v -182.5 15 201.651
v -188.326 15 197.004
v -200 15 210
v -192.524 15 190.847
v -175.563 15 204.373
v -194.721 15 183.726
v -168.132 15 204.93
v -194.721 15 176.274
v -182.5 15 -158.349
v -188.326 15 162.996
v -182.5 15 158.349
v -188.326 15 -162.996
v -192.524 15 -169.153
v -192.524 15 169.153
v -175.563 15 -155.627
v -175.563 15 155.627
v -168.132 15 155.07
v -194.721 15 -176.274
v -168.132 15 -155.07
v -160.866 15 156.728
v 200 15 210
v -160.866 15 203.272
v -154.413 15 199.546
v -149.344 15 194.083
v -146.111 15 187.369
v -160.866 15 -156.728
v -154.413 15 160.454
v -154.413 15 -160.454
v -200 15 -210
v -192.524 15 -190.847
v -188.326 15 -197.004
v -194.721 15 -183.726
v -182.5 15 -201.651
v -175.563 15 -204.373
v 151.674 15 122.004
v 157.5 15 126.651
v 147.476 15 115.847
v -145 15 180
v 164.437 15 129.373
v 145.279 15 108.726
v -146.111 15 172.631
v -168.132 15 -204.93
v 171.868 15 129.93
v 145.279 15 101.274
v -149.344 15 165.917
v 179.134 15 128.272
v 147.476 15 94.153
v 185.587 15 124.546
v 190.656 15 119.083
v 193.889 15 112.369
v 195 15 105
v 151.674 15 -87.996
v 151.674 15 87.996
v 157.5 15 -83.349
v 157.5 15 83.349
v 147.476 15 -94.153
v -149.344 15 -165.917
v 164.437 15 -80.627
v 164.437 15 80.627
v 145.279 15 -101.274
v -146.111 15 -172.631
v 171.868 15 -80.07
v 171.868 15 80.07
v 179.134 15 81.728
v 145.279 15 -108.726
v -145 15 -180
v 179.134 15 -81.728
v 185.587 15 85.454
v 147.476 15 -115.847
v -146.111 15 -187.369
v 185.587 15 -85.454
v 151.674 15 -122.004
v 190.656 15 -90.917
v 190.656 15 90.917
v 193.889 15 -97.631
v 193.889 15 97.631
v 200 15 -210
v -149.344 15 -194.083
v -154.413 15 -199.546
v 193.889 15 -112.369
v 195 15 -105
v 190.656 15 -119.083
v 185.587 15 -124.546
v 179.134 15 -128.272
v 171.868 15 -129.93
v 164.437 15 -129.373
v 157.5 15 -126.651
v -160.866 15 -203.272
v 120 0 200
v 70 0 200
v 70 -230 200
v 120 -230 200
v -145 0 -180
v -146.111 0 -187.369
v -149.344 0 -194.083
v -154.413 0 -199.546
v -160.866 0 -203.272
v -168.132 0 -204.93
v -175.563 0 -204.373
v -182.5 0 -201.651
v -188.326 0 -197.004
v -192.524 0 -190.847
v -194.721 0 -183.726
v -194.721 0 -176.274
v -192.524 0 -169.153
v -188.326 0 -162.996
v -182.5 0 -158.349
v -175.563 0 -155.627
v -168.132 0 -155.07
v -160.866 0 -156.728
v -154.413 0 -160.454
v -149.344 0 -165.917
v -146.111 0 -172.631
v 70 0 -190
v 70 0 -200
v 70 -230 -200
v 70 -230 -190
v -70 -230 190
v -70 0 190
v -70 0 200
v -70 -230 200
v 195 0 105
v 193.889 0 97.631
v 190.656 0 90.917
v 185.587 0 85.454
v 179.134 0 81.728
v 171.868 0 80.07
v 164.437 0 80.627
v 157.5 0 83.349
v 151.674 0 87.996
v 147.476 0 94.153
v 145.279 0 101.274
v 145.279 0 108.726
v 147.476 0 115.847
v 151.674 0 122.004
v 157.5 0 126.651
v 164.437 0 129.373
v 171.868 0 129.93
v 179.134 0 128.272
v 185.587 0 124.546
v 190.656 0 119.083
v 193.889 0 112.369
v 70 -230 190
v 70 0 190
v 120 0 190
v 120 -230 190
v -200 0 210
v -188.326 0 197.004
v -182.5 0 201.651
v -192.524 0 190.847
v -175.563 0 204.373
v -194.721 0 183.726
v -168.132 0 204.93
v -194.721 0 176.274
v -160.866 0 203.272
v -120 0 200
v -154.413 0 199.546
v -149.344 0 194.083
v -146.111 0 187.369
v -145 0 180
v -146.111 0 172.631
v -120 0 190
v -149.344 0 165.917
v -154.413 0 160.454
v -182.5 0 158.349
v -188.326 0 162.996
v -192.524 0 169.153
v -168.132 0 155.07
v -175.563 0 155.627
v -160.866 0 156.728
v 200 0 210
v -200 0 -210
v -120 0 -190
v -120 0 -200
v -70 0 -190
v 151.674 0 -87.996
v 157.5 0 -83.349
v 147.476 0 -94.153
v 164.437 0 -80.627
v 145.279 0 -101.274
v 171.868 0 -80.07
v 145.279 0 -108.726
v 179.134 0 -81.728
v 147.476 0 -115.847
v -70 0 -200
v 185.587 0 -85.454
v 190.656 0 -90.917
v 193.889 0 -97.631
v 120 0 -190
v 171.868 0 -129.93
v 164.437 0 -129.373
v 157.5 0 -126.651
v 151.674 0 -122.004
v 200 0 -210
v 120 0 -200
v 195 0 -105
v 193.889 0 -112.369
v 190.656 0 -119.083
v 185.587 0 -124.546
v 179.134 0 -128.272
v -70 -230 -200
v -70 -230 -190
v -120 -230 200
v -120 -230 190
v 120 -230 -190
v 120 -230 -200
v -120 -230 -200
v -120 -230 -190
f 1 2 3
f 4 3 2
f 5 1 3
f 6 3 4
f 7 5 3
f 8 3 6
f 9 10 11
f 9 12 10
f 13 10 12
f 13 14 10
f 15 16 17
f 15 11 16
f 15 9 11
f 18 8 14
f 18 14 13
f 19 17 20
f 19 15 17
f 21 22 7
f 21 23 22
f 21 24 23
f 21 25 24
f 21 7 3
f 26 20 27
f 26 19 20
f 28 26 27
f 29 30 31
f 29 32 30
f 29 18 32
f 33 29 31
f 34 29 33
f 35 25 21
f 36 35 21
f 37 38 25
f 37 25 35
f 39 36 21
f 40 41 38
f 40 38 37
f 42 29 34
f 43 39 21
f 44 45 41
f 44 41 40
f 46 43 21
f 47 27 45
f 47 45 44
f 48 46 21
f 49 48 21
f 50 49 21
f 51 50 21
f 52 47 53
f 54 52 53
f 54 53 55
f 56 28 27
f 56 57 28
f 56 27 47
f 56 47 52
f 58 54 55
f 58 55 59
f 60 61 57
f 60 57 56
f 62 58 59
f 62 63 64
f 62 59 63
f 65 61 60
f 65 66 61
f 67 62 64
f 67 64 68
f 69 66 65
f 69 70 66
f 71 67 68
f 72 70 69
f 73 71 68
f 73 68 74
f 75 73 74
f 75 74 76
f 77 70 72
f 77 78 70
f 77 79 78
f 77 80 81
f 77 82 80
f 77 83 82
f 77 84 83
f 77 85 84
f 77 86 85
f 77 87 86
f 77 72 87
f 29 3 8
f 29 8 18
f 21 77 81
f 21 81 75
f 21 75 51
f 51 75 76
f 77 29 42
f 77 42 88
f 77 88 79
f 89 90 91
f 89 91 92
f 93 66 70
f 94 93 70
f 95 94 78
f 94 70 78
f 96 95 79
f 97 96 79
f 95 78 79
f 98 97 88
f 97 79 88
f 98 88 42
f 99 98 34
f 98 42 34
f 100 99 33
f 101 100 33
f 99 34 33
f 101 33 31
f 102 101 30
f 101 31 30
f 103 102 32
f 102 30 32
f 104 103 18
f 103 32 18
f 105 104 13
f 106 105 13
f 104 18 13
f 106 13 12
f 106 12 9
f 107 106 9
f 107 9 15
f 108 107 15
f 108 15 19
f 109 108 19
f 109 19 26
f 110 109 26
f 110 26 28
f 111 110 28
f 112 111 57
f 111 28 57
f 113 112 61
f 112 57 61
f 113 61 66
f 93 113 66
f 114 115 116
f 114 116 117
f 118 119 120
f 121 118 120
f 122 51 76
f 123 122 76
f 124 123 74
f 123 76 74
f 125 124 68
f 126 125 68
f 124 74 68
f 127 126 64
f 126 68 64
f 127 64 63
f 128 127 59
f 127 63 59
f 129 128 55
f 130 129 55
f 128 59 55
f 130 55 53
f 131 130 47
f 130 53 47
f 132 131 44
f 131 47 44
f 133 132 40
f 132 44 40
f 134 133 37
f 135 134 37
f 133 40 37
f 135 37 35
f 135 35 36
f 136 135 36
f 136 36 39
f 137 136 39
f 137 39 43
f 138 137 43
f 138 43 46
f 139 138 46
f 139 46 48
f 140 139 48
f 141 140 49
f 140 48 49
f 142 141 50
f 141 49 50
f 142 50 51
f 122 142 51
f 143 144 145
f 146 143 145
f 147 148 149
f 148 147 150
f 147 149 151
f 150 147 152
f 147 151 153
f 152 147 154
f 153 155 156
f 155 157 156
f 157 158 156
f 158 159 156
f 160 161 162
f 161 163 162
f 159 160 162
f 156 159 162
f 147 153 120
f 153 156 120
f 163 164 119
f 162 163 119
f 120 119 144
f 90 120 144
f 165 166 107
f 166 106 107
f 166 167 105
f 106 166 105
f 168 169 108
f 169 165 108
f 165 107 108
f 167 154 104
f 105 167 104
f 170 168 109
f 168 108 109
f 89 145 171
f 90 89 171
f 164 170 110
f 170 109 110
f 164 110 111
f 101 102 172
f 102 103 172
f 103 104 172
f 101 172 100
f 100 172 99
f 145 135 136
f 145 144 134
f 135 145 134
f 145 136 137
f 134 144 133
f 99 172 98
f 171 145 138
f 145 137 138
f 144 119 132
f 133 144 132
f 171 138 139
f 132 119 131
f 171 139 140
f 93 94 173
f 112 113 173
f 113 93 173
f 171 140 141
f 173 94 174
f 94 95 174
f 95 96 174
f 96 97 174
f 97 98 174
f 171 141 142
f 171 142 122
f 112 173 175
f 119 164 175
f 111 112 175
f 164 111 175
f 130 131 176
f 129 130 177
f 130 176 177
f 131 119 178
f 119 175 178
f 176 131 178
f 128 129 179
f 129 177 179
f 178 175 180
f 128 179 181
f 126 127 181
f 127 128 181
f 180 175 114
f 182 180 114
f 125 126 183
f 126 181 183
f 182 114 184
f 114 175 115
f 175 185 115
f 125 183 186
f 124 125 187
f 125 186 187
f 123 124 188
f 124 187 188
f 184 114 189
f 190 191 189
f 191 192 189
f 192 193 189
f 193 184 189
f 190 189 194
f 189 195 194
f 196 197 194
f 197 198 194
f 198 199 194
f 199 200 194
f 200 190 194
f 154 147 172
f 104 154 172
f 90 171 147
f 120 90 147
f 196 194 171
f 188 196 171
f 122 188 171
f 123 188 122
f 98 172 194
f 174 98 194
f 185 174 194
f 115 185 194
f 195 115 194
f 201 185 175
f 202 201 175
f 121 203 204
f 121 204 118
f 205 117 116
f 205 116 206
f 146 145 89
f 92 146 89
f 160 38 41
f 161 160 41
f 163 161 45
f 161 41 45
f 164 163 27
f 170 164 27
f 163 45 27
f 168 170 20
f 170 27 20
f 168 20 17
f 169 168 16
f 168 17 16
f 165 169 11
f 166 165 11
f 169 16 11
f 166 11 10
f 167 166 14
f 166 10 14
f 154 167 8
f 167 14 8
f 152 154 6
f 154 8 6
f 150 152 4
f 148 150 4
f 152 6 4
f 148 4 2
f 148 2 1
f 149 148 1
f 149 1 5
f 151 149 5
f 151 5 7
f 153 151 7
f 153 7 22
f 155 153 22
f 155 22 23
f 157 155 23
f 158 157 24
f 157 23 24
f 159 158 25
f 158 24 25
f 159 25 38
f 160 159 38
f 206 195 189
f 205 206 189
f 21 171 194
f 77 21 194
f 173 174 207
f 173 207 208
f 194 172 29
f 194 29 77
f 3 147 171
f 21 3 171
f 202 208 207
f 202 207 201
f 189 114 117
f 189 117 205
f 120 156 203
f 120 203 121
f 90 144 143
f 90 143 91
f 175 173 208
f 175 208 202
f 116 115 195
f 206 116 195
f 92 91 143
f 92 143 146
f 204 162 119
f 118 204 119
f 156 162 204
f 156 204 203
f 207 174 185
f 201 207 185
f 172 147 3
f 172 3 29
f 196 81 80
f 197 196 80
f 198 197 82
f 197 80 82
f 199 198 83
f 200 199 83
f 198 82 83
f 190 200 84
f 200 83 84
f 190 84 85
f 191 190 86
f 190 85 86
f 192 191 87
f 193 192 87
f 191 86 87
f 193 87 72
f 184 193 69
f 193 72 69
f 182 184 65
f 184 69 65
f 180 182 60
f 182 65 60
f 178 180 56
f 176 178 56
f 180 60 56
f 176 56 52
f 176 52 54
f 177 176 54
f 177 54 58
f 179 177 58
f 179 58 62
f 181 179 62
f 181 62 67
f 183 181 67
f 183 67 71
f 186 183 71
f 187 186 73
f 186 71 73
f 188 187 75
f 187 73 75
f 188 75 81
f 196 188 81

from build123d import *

# Parameters (mm, degrees)
SKETCH1_W           = 400
SKETCH1_H           = 420
BOSS_EXTRUDE1_DEPTH = 15
SKETCH2_R           = 25
CUT_EXTRUDE1_DEPTH  = 15
SKETCH3_W           = 50
SKETCH3_H           = 10
BOSS_EXTRUDE2_DEPTH = 230


with BuildPart() as part:
    # Sketch1 → Boss-Extrude1 (new body)
    with BuildSketch(Plane(origin=(0, 0, 0), x_dir=(1, 0, 0), z_dir=(0, 1, 0))):
        Rectangle(SKETCH1_W, SKETCH1_H)
    extrude(amount=BOSS_EXTRUDE1_DEPTH)

    # Sketch2 → Cut-Extrude1 (cut)
    with BuildSketch(Plane(origin=(0, 15, 0), x_dir=(1, 0, 0), z_dir=(0, 1, 0))):
        with Locations((-170, 180)):
            Circle(SKETCH2_R)
        with Locations((-170, -180)):
            Circle(SKETCH2_R)
        with Locations((170, -105)):
            Circle(SKETCH2_R)
        with Locations((170, 105)):
            Circle(SKETCH2_R)
    extrude(amount=-CUT_EXTRUDE1_DEPTH, mode=Mode.SUBTRACT)

    # Sketch3 → Boss-Extrude2 (add)
    with BuildSketch(Plane.XZ):
        with Locations((-95, 195)):
            Rectangle(SKETCH3_W, SKETCH3_H)
        with Locations((95, 195)):
            Rectangle(SKETCH3_W, SKETCH3_H)
        with Locations((-95, -195)):
            Rectangle(SKETCH3_W, SKETCH3_H)
        with Locations((95, -195)):
            Rectangle(SKETCH3_W, SKETCH3_H)
    extrude(amount=BOSS_EXTRUDE2_DEPTH)


solid = part.part
